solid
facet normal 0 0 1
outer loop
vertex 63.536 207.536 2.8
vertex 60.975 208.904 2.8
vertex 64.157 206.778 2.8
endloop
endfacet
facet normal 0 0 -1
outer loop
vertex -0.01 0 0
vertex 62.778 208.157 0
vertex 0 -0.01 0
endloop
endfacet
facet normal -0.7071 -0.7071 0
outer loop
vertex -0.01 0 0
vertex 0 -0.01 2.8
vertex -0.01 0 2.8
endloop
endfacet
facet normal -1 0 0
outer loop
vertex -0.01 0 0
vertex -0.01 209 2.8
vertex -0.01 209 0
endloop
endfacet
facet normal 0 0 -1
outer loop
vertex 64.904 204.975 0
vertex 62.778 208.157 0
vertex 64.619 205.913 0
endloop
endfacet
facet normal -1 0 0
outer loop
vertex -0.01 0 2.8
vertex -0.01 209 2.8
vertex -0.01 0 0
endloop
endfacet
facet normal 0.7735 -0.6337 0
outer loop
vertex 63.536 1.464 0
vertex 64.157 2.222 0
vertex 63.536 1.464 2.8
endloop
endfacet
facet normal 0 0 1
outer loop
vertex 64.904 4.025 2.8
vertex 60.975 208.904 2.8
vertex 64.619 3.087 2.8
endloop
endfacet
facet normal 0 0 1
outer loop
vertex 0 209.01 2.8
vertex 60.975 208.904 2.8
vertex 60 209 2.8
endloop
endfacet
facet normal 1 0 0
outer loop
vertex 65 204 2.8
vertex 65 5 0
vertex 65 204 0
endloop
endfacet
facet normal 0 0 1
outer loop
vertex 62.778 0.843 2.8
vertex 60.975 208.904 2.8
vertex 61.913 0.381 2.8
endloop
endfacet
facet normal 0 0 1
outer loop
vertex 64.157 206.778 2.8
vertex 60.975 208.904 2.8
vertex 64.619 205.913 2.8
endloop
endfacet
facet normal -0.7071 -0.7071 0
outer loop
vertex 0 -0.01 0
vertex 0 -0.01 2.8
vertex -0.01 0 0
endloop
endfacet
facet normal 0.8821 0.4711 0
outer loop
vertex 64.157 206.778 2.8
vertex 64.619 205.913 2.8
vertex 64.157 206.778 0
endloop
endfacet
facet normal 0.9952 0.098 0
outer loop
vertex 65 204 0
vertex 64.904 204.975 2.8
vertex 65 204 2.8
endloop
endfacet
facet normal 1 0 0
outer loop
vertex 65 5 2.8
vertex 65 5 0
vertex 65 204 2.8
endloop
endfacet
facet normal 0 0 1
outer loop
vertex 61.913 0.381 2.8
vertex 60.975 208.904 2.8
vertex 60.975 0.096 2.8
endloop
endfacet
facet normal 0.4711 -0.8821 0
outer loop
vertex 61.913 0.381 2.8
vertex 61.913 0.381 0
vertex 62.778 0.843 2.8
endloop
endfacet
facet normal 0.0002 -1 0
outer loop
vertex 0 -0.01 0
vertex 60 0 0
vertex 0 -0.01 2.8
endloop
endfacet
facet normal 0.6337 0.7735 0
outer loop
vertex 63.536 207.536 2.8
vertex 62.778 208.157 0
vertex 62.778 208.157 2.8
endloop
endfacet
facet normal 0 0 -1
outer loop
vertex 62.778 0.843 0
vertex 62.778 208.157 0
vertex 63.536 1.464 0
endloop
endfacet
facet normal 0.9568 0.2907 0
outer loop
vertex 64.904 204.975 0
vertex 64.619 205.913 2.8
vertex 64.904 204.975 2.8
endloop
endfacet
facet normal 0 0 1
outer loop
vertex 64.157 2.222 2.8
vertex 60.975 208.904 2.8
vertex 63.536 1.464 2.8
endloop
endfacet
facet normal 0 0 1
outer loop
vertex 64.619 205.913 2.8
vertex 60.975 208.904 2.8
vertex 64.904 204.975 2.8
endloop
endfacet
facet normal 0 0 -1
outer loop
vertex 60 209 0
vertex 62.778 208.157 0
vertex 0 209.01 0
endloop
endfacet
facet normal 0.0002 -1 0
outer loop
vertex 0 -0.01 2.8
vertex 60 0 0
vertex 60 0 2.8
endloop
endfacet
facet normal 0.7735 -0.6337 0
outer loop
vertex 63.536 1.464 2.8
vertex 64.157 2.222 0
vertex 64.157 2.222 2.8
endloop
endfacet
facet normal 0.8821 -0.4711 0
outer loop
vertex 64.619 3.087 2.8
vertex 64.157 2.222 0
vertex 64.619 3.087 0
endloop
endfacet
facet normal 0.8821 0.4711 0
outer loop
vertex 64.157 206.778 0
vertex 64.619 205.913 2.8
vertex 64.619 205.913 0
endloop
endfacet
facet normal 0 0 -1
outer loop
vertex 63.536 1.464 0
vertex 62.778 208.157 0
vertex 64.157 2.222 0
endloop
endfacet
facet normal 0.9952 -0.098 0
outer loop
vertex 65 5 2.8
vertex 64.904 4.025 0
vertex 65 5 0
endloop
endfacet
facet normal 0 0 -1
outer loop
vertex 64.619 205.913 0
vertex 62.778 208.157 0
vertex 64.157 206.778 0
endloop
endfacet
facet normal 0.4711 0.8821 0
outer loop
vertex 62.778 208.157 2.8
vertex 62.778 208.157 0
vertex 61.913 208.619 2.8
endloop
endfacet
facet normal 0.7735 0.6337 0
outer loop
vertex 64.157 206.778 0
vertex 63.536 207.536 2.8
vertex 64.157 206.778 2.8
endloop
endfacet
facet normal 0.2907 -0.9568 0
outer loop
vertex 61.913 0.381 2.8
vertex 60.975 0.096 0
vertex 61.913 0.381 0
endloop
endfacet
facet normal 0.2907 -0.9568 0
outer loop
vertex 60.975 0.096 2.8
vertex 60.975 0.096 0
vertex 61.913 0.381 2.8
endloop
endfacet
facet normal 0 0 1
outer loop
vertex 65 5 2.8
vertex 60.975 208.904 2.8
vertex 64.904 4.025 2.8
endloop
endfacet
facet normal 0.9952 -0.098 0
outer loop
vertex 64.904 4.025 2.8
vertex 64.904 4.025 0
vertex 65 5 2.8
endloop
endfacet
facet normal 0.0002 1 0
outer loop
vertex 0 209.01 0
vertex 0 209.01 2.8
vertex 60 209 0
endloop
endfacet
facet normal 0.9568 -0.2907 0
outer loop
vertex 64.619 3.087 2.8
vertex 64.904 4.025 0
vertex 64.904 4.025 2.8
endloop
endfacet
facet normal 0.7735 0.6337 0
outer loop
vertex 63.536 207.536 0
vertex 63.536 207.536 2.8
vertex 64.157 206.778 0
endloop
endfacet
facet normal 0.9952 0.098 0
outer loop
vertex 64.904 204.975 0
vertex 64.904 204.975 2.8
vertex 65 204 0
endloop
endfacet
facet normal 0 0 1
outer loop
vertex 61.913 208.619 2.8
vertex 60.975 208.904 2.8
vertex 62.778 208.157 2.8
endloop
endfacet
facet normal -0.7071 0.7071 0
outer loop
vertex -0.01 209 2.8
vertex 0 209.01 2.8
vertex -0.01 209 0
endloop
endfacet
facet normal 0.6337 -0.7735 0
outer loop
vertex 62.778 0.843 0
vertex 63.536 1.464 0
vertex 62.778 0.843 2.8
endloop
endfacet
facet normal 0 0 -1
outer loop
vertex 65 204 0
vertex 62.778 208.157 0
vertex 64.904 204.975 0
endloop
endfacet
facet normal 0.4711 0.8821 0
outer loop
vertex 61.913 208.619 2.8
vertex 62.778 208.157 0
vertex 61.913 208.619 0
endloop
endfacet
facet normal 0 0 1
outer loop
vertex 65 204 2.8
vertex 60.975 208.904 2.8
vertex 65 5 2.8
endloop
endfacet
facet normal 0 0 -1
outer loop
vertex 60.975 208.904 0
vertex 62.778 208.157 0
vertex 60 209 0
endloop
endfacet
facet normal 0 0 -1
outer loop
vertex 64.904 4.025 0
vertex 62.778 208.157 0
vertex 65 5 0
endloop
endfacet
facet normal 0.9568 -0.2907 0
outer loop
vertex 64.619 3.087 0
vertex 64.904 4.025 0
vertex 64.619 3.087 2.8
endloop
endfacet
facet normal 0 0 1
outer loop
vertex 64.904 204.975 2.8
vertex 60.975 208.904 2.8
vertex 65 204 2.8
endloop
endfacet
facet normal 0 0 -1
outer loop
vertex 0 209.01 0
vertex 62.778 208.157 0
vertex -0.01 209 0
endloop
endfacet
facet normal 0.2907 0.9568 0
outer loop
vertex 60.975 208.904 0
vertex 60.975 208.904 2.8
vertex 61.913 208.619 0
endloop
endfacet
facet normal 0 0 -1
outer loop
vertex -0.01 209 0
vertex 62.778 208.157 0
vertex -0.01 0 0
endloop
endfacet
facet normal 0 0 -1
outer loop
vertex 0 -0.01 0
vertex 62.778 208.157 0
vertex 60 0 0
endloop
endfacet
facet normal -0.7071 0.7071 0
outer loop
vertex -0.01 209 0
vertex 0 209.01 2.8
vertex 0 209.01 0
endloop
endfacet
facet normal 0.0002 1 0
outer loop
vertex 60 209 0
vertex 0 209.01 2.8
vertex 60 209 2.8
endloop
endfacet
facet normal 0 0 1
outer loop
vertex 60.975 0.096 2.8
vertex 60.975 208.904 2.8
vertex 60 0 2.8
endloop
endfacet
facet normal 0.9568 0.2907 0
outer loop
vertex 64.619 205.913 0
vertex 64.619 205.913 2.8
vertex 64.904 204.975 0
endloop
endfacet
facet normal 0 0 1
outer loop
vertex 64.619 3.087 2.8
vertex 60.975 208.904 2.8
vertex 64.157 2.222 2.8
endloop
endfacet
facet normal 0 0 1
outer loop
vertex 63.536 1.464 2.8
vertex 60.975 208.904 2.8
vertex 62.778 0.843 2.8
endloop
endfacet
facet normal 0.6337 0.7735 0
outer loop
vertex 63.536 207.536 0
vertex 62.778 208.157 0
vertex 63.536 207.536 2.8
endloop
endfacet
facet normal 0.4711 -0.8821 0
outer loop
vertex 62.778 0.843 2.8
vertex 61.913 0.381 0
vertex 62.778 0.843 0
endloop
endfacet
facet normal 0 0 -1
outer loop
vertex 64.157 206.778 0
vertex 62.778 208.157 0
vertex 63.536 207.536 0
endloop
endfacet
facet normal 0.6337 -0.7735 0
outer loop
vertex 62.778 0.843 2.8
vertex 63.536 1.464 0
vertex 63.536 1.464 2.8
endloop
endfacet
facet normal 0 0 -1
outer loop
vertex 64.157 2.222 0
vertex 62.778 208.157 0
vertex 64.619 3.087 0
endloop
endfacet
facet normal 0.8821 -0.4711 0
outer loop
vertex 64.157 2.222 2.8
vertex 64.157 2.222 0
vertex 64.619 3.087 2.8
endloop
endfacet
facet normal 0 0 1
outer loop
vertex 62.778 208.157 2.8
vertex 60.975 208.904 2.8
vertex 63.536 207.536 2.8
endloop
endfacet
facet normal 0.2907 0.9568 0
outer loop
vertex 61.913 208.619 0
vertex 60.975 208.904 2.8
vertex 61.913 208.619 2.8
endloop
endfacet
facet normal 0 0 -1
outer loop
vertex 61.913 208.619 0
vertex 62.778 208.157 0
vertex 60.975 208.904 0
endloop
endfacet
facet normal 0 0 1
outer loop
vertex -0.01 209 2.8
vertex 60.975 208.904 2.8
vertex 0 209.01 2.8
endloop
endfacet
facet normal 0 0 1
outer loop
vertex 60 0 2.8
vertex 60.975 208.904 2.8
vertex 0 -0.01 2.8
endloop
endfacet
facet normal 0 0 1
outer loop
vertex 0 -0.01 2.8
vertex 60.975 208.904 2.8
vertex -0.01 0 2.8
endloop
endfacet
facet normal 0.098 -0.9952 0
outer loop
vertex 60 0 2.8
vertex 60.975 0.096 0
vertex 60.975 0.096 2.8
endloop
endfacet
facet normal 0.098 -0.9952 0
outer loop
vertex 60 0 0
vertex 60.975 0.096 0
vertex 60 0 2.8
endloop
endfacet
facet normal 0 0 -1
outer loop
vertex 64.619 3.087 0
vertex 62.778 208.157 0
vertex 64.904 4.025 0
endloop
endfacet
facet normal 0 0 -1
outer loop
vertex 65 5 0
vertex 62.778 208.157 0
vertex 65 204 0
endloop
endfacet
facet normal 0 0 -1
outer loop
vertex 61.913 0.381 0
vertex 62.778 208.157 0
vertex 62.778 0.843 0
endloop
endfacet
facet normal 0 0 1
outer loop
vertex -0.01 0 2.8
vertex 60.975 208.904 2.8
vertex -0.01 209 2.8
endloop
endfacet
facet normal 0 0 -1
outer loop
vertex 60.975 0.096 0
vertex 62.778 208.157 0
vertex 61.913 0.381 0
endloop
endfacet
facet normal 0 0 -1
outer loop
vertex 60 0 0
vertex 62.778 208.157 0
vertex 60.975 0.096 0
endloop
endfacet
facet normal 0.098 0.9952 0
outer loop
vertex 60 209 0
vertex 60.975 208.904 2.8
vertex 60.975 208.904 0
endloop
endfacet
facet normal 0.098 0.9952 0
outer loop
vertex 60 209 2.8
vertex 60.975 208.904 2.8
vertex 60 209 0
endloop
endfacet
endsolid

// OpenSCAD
// 机箱前面板 - B部分
// 尺寸: 65mm x 209mm x 2.8mm
// 接缝处无倒角

// 参数
width = 65;      // 宽度 (mm)
height = 209;    // 高度 (mm)
thickness = 2.8; // 厚度 (mm)
corner_radius = 5;  // 倒角半径 (mm)

// 圆角矩形模块 - 只在右侧、上侧、下侧倒角，左侧（接缝处）不倒角
module rounded_rect_one_side(w, h, r, t) {
    hull() {
        // 左下角（接缝处，不倒角）
        translate([0, 0, 0])
        cylinder(h = t, r = 0.01, $fn = 4);
        // 左上角（接缝处，不倒角）
        translate([0, h, 0])
        cylinder(h = t, r = 0.01, $fn = 4);
        // 右上角
        translate([w - r, h - r, 0]) cylinder(h = t, r = r, $fn = 32);
        // 右下角
        translate([w - r, r, 0]) cylinder(h = t, r = r, $fn = 32);
    }
}

// 创建面板
color("LightGray") {
    rounded_rect_one_side(width, height, corner_radius, thickness);
}
